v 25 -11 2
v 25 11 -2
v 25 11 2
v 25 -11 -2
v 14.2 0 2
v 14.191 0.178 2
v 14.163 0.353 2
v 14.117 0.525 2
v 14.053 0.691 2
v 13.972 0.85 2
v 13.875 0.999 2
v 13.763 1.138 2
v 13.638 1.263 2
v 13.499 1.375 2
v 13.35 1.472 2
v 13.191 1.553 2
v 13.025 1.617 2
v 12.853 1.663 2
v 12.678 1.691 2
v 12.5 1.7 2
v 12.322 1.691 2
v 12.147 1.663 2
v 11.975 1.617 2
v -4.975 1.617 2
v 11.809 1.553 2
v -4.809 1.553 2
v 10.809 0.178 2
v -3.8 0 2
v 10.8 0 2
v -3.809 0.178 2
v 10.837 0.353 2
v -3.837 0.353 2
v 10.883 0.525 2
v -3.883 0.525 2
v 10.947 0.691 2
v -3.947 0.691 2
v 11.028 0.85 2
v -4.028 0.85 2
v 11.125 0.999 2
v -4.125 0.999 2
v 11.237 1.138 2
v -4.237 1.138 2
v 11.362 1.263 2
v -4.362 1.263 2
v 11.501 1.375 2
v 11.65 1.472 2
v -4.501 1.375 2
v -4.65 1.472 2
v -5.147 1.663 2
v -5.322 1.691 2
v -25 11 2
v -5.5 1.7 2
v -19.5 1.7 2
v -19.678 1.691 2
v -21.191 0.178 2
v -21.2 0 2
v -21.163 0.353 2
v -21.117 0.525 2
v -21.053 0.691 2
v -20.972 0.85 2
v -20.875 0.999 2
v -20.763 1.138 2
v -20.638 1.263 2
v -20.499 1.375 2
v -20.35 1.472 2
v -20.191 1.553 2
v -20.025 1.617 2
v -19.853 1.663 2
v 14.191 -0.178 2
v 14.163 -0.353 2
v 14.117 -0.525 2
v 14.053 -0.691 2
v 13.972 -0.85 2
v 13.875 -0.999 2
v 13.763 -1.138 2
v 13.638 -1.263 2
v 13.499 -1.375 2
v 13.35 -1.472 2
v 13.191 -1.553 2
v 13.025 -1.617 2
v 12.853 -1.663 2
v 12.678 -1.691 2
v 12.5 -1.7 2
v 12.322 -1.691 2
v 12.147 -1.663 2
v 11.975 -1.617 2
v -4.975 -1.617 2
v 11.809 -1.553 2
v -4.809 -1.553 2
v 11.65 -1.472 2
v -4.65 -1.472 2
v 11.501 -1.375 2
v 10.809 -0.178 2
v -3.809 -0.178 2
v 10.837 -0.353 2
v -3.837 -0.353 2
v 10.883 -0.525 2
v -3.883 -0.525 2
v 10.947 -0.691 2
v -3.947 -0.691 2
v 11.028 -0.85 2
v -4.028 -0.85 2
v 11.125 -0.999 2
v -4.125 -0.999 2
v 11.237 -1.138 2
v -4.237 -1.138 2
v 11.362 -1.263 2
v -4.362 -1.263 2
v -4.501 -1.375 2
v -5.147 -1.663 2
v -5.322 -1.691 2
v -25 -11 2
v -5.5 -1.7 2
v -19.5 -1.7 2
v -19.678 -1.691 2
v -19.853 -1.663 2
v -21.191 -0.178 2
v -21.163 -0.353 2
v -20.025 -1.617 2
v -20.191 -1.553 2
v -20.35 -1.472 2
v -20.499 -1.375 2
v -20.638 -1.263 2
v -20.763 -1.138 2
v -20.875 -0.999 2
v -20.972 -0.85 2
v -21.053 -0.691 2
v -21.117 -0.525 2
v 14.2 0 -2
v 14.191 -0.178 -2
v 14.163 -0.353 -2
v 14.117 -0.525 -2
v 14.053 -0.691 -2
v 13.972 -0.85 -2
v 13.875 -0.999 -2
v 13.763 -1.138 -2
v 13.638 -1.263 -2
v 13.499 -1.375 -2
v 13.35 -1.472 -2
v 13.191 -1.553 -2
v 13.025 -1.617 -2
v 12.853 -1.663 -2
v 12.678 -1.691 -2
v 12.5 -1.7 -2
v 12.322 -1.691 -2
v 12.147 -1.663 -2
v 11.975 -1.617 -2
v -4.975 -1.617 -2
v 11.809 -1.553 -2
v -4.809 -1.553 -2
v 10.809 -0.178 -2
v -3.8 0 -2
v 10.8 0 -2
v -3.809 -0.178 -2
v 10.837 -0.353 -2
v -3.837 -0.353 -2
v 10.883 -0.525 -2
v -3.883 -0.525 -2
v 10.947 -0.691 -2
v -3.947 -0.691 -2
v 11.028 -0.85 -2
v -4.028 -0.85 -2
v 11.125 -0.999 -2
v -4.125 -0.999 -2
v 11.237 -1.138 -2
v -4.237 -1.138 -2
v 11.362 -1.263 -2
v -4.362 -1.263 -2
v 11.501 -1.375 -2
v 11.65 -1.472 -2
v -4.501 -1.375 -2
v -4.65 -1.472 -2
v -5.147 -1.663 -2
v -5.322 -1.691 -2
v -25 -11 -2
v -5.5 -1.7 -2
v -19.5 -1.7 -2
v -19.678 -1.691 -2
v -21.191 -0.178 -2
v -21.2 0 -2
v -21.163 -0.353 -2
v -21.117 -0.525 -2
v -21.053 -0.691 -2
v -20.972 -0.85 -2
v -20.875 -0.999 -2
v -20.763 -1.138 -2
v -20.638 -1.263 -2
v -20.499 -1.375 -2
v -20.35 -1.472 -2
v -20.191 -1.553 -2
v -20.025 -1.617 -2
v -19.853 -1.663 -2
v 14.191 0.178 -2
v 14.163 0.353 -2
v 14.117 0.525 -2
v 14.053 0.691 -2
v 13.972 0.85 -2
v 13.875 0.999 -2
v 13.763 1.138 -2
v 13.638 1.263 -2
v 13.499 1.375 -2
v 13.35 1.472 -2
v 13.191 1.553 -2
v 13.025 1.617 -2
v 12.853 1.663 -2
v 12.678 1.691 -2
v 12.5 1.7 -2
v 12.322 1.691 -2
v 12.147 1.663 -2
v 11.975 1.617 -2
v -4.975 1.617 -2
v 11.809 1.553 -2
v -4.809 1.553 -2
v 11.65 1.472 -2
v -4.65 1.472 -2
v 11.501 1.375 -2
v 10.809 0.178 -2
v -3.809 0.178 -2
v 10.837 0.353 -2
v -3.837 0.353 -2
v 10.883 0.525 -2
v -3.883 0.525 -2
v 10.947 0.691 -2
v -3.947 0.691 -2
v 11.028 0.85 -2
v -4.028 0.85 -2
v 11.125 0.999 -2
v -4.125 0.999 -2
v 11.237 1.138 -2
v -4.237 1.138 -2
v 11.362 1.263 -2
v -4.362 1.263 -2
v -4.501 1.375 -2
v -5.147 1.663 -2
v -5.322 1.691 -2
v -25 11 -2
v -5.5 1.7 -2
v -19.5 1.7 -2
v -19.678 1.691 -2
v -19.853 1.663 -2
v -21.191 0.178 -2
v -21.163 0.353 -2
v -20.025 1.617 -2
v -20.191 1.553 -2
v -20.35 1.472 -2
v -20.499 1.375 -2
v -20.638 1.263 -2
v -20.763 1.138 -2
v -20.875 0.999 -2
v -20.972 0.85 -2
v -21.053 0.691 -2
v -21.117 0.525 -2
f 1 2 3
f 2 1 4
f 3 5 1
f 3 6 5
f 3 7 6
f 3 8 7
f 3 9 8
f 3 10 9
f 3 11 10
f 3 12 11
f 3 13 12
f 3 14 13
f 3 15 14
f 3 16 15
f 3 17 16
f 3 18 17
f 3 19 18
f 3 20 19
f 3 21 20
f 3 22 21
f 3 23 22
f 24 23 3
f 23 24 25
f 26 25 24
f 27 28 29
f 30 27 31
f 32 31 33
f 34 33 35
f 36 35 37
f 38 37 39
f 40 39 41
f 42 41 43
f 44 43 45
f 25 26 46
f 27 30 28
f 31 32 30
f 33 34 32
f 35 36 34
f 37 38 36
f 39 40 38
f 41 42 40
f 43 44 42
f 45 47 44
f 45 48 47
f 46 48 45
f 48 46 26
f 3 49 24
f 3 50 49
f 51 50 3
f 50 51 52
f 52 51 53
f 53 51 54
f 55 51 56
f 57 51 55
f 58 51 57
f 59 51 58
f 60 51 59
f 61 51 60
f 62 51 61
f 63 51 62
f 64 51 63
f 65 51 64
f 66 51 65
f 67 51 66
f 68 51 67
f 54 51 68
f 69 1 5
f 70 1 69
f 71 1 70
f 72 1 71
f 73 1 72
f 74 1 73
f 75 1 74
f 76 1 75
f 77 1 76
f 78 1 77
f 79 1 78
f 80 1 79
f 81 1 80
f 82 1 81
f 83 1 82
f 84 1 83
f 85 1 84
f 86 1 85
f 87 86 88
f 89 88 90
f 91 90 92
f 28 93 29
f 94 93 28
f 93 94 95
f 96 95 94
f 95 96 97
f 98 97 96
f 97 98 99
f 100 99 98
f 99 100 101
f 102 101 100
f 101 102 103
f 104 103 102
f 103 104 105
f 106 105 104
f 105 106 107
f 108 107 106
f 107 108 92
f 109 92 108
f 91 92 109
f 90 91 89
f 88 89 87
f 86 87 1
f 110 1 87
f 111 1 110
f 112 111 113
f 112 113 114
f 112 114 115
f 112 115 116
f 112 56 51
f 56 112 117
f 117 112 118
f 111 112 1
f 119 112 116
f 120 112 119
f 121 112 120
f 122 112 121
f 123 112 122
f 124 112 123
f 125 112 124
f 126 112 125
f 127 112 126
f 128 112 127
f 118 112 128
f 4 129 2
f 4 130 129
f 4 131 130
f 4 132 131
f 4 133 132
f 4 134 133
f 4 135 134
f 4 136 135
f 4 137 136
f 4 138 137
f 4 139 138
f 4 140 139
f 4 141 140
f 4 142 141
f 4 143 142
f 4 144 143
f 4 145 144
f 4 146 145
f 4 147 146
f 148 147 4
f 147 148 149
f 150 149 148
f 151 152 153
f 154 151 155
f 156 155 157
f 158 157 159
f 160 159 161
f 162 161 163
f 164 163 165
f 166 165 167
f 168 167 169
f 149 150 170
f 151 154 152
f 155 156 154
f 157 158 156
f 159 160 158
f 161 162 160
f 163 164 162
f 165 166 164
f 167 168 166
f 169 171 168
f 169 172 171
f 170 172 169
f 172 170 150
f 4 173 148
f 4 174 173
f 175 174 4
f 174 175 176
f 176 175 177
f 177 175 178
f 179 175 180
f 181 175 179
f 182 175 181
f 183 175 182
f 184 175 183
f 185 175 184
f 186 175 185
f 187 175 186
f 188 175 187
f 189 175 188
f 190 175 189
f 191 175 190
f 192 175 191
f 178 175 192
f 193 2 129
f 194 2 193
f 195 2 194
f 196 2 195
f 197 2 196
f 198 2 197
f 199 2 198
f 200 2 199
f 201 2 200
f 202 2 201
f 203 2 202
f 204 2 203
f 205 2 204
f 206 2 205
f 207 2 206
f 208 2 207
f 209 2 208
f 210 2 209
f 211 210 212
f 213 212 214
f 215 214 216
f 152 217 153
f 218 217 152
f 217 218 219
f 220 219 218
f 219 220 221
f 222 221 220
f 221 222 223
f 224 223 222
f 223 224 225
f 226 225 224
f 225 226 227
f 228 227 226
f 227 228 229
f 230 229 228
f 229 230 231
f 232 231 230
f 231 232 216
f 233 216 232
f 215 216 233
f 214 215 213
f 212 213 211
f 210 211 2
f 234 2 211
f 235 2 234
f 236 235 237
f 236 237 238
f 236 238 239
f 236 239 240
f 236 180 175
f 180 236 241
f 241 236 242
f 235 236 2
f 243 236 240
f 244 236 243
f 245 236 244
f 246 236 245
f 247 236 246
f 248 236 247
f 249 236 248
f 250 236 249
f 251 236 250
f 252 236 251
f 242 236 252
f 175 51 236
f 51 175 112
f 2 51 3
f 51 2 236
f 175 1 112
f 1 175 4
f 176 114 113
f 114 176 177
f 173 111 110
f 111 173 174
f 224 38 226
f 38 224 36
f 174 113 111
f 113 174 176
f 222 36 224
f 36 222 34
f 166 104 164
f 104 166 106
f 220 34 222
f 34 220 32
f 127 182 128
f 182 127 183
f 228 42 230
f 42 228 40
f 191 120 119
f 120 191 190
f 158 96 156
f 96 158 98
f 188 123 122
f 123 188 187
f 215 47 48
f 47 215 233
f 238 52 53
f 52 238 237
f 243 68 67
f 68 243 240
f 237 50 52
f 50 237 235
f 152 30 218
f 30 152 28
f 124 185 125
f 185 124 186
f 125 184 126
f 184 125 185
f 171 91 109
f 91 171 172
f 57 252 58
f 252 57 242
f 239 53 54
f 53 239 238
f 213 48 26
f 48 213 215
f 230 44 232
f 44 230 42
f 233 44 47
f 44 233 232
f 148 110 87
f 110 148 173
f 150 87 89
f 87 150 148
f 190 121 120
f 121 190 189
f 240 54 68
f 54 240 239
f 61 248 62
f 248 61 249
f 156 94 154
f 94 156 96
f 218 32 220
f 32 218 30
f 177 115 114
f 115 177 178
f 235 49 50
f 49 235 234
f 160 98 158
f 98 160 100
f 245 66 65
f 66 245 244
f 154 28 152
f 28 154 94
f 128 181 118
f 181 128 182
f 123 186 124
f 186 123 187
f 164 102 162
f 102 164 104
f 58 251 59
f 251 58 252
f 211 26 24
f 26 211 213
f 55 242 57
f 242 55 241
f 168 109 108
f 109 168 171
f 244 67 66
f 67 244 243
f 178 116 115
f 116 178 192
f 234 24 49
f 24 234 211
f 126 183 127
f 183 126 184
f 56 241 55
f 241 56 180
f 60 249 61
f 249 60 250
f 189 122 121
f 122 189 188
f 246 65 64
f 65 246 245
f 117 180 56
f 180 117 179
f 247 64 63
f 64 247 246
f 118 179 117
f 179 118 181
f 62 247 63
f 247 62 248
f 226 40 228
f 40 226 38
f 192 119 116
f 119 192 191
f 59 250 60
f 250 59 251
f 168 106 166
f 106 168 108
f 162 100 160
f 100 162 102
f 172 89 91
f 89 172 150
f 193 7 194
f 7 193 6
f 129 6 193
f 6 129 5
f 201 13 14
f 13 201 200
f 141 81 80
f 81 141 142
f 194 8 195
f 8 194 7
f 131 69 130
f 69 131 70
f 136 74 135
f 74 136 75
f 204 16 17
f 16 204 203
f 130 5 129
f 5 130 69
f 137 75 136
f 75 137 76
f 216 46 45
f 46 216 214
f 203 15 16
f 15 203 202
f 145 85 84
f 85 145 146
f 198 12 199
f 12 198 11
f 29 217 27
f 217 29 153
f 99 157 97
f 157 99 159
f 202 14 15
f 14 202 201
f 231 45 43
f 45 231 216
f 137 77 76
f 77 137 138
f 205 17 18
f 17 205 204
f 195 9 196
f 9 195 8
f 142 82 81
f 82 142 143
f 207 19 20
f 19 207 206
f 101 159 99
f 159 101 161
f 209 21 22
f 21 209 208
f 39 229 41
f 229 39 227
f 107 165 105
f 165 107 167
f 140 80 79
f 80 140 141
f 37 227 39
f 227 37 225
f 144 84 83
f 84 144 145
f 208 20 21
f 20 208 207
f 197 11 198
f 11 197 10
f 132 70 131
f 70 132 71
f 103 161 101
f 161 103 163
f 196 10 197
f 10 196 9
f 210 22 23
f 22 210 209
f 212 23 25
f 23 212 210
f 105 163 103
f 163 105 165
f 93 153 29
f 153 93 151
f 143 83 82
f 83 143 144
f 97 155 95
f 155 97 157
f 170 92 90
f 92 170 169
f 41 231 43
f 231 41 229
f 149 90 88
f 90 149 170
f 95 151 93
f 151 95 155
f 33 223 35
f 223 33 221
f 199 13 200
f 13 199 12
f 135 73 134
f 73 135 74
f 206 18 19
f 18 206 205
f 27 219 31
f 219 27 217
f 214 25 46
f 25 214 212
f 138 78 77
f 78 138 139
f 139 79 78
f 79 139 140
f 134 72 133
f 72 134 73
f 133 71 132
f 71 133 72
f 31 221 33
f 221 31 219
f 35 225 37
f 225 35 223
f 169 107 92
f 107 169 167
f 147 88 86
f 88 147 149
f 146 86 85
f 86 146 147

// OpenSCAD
// Adjustable sensor mounting tab.
$fn = 60;
eps = 0.02;
length = 50;
width = 22;
thickness = 4;
slot_l = 14;
module slot(x) { hull() { translate([x-slot_l/2,0,-thickness/2-eps]) cylinder(d=3.4,h=thickness+2*eps); translate([x+slot_l/2,0,-thickness/2-eps]) cylinder(d=3.4,h=thickness+2*eps); } }
difference() { cube([length,width,thickness],center=true); slot(-length/4); translate([length/4,0,-thickness/2-eps]) cylinder(d=3.4,h=thickness+2*eps); }
